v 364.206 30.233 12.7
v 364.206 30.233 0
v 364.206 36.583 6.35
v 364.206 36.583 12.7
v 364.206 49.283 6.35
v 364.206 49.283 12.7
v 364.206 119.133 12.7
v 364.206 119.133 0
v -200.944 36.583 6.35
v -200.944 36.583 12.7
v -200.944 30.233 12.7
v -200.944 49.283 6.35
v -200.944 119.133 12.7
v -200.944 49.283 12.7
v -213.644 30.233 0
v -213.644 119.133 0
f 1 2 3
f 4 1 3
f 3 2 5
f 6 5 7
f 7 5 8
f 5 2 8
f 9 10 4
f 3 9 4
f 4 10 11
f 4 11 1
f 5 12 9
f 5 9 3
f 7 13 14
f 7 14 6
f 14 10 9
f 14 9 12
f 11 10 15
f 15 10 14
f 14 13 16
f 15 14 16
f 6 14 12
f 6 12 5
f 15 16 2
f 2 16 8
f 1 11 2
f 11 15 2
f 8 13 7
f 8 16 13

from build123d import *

# Parameters (mm, degrees)
SKETCH1_W           = 577.85
SKETCH1_H           = 88.9
BOSS_EXTRUDE1_DEPTH = 12.7
CUT_EXTRUDE1_DEPTH  = 89.9
SKETCH4_W           = 565.15
SKETCH4_H           = 12.7
CUT_EXTRUDE3_DEPTH  = 6.35


with BuildPart() as part:
    # Sketch1 → Boss-Extrude1 (new body)
    with BuildSketch(Plane.XY):
        with Locations((75.280996393, 74.68264202)):
            Rectangle(SKETCH1_W, SKETCH1_H)
    extrude(amount=BOSS_EXTRUDE1_DEPTH)

    # Sketch2 → Cut-Extrude1 (cut, through all)
    with BuildSketch(Plane(origin=(0, 119.13264202, 0), x_dir=(1, 0, 0), z_dir=(0, 1, 0))):
        Polygon((-200.944003607, -12.7), (-213.644003607, 0), (-213.644003607, -12.7), align=None)
    extrude(amount=-CUT_EXTRUDE1_DEPTH, mode=Mode.SUBTRACT)

    # Sketch4 → Cut-Extrude3 (cut)
    with BuildSketch(Plane.XY.offset(12.7)):
        with Locations((81.630996393, 42.93264202)):
            Rectangle(SKETCH4_W, SKETCH4_H)
    extrude(amount=-CUT_EXTRUDE3_DEPTH, mode=Mode.SUBTRACT)


solid = part.part
